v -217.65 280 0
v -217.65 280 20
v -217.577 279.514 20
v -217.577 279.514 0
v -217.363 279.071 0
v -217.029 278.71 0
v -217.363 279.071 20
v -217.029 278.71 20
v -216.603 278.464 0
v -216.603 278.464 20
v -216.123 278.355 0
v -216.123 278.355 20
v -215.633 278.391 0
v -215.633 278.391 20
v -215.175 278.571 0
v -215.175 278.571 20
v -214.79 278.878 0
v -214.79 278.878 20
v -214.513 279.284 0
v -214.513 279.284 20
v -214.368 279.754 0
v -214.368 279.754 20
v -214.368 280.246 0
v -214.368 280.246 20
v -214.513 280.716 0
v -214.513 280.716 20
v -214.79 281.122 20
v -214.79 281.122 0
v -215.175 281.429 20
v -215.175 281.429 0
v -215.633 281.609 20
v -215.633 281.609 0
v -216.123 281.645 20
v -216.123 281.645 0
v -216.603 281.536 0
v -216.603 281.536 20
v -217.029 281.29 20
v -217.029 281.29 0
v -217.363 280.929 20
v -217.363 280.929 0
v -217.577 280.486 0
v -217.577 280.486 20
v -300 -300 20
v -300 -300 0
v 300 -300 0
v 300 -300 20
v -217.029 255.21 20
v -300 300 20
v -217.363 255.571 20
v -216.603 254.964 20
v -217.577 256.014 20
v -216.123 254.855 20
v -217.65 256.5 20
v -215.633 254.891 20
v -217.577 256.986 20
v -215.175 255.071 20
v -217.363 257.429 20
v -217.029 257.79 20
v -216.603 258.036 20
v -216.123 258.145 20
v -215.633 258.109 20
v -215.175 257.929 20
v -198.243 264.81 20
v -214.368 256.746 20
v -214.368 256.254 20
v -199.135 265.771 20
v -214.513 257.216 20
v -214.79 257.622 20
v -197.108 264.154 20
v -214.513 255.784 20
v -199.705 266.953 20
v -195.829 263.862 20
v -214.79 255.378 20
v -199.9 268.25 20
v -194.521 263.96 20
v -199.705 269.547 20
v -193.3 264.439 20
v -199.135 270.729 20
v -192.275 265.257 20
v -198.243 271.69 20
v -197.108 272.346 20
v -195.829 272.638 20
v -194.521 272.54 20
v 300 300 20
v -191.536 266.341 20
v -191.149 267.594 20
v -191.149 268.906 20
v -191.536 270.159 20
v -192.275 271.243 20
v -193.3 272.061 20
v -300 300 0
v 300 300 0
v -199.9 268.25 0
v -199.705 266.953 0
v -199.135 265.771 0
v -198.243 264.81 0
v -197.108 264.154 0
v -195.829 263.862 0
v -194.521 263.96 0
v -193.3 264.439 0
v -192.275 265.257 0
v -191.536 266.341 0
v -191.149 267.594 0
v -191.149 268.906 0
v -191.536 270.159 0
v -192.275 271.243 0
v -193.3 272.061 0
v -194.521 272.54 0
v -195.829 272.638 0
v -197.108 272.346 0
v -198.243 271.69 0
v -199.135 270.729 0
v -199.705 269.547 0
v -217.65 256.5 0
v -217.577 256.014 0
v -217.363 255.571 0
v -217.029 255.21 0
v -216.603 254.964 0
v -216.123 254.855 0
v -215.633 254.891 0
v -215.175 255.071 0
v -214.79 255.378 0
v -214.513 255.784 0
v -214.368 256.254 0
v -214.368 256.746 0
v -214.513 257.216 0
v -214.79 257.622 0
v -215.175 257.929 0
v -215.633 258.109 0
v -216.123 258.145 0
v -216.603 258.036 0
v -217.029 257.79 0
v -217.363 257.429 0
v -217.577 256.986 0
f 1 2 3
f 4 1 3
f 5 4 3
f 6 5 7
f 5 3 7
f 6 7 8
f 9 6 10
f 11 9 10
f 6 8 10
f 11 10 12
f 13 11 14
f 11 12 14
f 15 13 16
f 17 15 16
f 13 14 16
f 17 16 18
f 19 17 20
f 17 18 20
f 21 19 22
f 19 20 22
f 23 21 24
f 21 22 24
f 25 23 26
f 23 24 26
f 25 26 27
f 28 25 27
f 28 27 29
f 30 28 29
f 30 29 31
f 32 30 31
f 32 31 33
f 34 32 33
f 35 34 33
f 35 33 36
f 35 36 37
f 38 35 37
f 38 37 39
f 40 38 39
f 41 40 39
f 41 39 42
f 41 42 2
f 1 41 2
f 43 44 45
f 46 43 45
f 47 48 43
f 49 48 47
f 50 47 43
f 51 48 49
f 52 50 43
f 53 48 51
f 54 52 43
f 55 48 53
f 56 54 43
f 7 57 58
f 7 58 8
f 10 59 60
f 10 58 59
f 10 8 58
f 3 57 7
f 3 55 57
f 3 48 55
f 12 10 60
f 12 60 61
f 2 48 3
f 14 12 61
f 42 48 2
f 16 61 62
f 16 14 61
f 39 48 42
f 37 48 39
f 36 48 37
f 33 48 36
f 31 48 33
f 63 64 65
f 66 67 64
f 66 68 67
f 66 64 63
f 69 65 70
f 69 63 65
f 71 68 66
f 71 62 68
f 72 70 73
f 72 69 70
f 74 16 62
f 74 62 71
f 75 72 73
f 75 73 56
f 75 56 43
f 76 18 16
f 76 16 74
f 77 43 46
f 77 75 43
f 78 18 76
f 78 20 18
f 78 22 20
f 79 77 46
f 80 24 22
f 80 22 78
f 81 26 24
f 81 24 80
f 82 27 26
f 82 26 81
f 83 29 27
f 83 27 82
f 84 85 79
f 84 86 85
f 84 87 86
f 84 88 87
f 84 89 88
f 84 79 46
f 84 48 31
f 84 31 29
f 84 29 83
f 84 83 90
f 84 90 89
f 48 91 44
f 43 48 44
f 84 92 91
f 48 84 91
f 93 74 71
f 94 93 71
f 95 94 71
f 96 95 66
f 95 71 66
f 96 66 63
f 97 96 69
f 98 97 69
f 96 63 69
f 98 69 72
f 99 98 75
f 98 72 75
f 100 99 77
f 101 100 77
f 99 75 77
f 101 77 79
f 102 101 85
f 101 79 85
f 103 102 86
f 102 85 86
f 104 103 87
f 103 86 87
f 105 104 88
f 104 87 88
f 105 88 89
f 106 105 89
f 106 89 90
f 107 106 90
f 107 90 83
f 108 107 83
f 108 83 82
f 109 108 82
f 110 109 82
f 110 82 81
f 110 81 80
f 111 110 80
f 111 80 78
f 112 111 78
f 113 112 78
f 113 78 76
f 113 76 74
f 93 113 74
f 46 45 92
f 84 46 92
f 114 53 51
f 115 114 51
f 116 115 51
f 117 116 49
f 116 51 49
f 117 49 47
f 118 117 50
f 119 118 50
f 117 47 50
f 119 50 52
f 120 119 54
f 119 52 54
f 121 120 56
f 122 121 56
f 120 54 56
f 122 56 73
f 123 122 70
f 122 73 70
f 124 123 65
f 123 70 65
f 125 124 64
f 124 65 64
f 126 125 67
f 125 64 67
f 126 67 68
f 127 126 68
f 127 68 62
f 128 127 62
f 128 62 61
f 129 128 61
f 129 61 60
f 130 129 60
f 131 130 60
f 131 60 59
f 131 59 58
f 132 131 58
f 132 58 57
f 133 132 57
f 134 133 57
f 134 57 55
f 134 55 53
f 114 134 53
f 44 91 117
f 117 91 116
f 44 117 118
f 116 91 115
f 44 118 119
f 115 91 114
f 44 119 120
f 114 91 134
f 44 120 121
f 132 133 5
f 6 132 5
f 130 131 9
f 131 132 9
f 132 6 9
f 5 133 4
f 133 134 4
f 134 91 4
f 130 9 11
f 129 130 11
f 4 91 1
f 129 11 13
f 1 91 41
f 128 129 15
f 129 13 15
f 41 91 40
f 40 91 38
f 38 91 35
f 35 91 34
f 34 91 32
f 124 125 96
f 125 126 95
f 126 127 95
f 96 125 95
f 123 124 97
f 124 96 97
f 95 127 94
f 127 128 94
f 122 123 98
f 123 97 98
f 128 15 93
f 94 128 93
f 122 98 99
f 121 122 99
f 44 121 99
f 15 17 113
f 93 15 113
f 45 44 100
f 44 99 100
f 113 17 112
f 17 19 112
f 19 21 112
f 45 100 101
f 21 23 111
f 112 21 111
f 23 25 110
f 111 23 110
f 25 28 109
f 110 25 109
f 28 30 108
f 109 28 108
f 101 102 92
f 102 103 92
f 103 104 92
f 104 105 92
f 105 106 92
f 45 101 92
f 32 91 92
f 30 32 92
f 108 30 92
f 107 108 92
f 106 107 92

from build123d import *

# Parameters (mm, degrees)
F0_W     = 84
F0_H     = 20
F0_W_2   = 423
F0_W_3   = 9
F0_H_2   = 11.75
F1_DEPTH = 20
F2_D     = 3.3
F3_D     = 8.8


with BuildPart() as f1:
    # F0 (on Top) → F1 (new body)
    with BuildSketch(Plane.XY):
        with Locations((258, -290)):
            Rectangle(F0_W, F0_H)
        with Locations((4.5, -290)):
            Rectangle(F0_W_2, F0_H)
        Polygon((216, -280), (300, -280), (300, 280), (216, 280), (216, 268.25), (216, 256.5), align=None)
        with Locations((-211.5, -290)):
            Rectangle(F0_W_3, F0_H)
        with BuildLine():
            Line((-207, -280), (216, -280))
            Line((216, -280), (216, 256.5))
            Line((216, 256.5), (216, 268.25))
            Line((216, 268.25), (-184.5, 268.25))
            ThreePointArc((-184.5, 268.25), (-195.5, 257.25), (-206.5, 268.25))
            Line((-206.5, 268.25), (-207, 268.25))
            Line((-207, 268.25), (-207, -280))
        make_face()
        with Locations((258, 290)):
            Rectangle(F0_W, F0_H)
        with Locations((-258, -290)):
            Rectangle(F0_W, F0_H)
        Polygon((-216, -280), (-207, -280), (-207, 268.25), (-216, 268.25), (-216, 256.5), align=None)
        Polygon((-207, 280), (216, 280), (216, 300), (-216, 300), (-216, 280), align=None)
        with BuildLine():
            Line((216, 268.25), (216, 280))
            Line((216, 280), (-207, 280))
            Line((-207, 280), (-207, 268.25))
            Line((-207, 268.25), (-206.5, 268.25))
            ThreePointArc((-206.5, 268.25), (-195.5, 279.25), (-184.5, 268.25))
            Line((-184.5, 268.25), (216, 268.25))
        make_face()
        Polygon((-300, -280), (-216, -280), (-216, 256.5), (-216, 268.25), (-216, 280), (-300, 280), align=None)
        with Locations((-211.5, 274.125)):
            Rectangle(F0_W_3, F0_H_2)
        with BuildLine():
            ThreePointArc((-184.5, 268.25), (-195.5, 279.25), (-206.5, 268.25))
            Line((-206.5, 268.25), (-195.5, 268.25))
            Line((-195.5, 268.25), (-184.5, 268.25))
        make_face()
        with BuildLine():
            Line((-195.5, 268.25), (-206.5, 268.25))
            ThreePointArc((-206.5, 268.25), (-195.5, 257.25), (-184.5, 268.25))
            Line((-184.5, 268.25), (-195.5, 268.25))
        make_face()
        with Locations((-258, 290)):
            Rectangle(F0_W, F0_H)
    extrude(amount=F1_DEPTH)

    # F2 (through all)
    with Locations(Plane(origin=(0, 0, 0), x_dir=(1, 0, 0), z_dir=(0, 0, -1))):
        with Locations((-216, -280), (-216, -256.5)):
            Hole(F2_D / 2)

    # F3 (through all)
    with Locations(Plane(origin=(0, 0, 0), x_dir=(1, 0, 0), z_dir=(0, 0, -1))):
        with Locations((-195.5, -268.25)):
            Hole(F3_D / 2)


solid = f1.part
